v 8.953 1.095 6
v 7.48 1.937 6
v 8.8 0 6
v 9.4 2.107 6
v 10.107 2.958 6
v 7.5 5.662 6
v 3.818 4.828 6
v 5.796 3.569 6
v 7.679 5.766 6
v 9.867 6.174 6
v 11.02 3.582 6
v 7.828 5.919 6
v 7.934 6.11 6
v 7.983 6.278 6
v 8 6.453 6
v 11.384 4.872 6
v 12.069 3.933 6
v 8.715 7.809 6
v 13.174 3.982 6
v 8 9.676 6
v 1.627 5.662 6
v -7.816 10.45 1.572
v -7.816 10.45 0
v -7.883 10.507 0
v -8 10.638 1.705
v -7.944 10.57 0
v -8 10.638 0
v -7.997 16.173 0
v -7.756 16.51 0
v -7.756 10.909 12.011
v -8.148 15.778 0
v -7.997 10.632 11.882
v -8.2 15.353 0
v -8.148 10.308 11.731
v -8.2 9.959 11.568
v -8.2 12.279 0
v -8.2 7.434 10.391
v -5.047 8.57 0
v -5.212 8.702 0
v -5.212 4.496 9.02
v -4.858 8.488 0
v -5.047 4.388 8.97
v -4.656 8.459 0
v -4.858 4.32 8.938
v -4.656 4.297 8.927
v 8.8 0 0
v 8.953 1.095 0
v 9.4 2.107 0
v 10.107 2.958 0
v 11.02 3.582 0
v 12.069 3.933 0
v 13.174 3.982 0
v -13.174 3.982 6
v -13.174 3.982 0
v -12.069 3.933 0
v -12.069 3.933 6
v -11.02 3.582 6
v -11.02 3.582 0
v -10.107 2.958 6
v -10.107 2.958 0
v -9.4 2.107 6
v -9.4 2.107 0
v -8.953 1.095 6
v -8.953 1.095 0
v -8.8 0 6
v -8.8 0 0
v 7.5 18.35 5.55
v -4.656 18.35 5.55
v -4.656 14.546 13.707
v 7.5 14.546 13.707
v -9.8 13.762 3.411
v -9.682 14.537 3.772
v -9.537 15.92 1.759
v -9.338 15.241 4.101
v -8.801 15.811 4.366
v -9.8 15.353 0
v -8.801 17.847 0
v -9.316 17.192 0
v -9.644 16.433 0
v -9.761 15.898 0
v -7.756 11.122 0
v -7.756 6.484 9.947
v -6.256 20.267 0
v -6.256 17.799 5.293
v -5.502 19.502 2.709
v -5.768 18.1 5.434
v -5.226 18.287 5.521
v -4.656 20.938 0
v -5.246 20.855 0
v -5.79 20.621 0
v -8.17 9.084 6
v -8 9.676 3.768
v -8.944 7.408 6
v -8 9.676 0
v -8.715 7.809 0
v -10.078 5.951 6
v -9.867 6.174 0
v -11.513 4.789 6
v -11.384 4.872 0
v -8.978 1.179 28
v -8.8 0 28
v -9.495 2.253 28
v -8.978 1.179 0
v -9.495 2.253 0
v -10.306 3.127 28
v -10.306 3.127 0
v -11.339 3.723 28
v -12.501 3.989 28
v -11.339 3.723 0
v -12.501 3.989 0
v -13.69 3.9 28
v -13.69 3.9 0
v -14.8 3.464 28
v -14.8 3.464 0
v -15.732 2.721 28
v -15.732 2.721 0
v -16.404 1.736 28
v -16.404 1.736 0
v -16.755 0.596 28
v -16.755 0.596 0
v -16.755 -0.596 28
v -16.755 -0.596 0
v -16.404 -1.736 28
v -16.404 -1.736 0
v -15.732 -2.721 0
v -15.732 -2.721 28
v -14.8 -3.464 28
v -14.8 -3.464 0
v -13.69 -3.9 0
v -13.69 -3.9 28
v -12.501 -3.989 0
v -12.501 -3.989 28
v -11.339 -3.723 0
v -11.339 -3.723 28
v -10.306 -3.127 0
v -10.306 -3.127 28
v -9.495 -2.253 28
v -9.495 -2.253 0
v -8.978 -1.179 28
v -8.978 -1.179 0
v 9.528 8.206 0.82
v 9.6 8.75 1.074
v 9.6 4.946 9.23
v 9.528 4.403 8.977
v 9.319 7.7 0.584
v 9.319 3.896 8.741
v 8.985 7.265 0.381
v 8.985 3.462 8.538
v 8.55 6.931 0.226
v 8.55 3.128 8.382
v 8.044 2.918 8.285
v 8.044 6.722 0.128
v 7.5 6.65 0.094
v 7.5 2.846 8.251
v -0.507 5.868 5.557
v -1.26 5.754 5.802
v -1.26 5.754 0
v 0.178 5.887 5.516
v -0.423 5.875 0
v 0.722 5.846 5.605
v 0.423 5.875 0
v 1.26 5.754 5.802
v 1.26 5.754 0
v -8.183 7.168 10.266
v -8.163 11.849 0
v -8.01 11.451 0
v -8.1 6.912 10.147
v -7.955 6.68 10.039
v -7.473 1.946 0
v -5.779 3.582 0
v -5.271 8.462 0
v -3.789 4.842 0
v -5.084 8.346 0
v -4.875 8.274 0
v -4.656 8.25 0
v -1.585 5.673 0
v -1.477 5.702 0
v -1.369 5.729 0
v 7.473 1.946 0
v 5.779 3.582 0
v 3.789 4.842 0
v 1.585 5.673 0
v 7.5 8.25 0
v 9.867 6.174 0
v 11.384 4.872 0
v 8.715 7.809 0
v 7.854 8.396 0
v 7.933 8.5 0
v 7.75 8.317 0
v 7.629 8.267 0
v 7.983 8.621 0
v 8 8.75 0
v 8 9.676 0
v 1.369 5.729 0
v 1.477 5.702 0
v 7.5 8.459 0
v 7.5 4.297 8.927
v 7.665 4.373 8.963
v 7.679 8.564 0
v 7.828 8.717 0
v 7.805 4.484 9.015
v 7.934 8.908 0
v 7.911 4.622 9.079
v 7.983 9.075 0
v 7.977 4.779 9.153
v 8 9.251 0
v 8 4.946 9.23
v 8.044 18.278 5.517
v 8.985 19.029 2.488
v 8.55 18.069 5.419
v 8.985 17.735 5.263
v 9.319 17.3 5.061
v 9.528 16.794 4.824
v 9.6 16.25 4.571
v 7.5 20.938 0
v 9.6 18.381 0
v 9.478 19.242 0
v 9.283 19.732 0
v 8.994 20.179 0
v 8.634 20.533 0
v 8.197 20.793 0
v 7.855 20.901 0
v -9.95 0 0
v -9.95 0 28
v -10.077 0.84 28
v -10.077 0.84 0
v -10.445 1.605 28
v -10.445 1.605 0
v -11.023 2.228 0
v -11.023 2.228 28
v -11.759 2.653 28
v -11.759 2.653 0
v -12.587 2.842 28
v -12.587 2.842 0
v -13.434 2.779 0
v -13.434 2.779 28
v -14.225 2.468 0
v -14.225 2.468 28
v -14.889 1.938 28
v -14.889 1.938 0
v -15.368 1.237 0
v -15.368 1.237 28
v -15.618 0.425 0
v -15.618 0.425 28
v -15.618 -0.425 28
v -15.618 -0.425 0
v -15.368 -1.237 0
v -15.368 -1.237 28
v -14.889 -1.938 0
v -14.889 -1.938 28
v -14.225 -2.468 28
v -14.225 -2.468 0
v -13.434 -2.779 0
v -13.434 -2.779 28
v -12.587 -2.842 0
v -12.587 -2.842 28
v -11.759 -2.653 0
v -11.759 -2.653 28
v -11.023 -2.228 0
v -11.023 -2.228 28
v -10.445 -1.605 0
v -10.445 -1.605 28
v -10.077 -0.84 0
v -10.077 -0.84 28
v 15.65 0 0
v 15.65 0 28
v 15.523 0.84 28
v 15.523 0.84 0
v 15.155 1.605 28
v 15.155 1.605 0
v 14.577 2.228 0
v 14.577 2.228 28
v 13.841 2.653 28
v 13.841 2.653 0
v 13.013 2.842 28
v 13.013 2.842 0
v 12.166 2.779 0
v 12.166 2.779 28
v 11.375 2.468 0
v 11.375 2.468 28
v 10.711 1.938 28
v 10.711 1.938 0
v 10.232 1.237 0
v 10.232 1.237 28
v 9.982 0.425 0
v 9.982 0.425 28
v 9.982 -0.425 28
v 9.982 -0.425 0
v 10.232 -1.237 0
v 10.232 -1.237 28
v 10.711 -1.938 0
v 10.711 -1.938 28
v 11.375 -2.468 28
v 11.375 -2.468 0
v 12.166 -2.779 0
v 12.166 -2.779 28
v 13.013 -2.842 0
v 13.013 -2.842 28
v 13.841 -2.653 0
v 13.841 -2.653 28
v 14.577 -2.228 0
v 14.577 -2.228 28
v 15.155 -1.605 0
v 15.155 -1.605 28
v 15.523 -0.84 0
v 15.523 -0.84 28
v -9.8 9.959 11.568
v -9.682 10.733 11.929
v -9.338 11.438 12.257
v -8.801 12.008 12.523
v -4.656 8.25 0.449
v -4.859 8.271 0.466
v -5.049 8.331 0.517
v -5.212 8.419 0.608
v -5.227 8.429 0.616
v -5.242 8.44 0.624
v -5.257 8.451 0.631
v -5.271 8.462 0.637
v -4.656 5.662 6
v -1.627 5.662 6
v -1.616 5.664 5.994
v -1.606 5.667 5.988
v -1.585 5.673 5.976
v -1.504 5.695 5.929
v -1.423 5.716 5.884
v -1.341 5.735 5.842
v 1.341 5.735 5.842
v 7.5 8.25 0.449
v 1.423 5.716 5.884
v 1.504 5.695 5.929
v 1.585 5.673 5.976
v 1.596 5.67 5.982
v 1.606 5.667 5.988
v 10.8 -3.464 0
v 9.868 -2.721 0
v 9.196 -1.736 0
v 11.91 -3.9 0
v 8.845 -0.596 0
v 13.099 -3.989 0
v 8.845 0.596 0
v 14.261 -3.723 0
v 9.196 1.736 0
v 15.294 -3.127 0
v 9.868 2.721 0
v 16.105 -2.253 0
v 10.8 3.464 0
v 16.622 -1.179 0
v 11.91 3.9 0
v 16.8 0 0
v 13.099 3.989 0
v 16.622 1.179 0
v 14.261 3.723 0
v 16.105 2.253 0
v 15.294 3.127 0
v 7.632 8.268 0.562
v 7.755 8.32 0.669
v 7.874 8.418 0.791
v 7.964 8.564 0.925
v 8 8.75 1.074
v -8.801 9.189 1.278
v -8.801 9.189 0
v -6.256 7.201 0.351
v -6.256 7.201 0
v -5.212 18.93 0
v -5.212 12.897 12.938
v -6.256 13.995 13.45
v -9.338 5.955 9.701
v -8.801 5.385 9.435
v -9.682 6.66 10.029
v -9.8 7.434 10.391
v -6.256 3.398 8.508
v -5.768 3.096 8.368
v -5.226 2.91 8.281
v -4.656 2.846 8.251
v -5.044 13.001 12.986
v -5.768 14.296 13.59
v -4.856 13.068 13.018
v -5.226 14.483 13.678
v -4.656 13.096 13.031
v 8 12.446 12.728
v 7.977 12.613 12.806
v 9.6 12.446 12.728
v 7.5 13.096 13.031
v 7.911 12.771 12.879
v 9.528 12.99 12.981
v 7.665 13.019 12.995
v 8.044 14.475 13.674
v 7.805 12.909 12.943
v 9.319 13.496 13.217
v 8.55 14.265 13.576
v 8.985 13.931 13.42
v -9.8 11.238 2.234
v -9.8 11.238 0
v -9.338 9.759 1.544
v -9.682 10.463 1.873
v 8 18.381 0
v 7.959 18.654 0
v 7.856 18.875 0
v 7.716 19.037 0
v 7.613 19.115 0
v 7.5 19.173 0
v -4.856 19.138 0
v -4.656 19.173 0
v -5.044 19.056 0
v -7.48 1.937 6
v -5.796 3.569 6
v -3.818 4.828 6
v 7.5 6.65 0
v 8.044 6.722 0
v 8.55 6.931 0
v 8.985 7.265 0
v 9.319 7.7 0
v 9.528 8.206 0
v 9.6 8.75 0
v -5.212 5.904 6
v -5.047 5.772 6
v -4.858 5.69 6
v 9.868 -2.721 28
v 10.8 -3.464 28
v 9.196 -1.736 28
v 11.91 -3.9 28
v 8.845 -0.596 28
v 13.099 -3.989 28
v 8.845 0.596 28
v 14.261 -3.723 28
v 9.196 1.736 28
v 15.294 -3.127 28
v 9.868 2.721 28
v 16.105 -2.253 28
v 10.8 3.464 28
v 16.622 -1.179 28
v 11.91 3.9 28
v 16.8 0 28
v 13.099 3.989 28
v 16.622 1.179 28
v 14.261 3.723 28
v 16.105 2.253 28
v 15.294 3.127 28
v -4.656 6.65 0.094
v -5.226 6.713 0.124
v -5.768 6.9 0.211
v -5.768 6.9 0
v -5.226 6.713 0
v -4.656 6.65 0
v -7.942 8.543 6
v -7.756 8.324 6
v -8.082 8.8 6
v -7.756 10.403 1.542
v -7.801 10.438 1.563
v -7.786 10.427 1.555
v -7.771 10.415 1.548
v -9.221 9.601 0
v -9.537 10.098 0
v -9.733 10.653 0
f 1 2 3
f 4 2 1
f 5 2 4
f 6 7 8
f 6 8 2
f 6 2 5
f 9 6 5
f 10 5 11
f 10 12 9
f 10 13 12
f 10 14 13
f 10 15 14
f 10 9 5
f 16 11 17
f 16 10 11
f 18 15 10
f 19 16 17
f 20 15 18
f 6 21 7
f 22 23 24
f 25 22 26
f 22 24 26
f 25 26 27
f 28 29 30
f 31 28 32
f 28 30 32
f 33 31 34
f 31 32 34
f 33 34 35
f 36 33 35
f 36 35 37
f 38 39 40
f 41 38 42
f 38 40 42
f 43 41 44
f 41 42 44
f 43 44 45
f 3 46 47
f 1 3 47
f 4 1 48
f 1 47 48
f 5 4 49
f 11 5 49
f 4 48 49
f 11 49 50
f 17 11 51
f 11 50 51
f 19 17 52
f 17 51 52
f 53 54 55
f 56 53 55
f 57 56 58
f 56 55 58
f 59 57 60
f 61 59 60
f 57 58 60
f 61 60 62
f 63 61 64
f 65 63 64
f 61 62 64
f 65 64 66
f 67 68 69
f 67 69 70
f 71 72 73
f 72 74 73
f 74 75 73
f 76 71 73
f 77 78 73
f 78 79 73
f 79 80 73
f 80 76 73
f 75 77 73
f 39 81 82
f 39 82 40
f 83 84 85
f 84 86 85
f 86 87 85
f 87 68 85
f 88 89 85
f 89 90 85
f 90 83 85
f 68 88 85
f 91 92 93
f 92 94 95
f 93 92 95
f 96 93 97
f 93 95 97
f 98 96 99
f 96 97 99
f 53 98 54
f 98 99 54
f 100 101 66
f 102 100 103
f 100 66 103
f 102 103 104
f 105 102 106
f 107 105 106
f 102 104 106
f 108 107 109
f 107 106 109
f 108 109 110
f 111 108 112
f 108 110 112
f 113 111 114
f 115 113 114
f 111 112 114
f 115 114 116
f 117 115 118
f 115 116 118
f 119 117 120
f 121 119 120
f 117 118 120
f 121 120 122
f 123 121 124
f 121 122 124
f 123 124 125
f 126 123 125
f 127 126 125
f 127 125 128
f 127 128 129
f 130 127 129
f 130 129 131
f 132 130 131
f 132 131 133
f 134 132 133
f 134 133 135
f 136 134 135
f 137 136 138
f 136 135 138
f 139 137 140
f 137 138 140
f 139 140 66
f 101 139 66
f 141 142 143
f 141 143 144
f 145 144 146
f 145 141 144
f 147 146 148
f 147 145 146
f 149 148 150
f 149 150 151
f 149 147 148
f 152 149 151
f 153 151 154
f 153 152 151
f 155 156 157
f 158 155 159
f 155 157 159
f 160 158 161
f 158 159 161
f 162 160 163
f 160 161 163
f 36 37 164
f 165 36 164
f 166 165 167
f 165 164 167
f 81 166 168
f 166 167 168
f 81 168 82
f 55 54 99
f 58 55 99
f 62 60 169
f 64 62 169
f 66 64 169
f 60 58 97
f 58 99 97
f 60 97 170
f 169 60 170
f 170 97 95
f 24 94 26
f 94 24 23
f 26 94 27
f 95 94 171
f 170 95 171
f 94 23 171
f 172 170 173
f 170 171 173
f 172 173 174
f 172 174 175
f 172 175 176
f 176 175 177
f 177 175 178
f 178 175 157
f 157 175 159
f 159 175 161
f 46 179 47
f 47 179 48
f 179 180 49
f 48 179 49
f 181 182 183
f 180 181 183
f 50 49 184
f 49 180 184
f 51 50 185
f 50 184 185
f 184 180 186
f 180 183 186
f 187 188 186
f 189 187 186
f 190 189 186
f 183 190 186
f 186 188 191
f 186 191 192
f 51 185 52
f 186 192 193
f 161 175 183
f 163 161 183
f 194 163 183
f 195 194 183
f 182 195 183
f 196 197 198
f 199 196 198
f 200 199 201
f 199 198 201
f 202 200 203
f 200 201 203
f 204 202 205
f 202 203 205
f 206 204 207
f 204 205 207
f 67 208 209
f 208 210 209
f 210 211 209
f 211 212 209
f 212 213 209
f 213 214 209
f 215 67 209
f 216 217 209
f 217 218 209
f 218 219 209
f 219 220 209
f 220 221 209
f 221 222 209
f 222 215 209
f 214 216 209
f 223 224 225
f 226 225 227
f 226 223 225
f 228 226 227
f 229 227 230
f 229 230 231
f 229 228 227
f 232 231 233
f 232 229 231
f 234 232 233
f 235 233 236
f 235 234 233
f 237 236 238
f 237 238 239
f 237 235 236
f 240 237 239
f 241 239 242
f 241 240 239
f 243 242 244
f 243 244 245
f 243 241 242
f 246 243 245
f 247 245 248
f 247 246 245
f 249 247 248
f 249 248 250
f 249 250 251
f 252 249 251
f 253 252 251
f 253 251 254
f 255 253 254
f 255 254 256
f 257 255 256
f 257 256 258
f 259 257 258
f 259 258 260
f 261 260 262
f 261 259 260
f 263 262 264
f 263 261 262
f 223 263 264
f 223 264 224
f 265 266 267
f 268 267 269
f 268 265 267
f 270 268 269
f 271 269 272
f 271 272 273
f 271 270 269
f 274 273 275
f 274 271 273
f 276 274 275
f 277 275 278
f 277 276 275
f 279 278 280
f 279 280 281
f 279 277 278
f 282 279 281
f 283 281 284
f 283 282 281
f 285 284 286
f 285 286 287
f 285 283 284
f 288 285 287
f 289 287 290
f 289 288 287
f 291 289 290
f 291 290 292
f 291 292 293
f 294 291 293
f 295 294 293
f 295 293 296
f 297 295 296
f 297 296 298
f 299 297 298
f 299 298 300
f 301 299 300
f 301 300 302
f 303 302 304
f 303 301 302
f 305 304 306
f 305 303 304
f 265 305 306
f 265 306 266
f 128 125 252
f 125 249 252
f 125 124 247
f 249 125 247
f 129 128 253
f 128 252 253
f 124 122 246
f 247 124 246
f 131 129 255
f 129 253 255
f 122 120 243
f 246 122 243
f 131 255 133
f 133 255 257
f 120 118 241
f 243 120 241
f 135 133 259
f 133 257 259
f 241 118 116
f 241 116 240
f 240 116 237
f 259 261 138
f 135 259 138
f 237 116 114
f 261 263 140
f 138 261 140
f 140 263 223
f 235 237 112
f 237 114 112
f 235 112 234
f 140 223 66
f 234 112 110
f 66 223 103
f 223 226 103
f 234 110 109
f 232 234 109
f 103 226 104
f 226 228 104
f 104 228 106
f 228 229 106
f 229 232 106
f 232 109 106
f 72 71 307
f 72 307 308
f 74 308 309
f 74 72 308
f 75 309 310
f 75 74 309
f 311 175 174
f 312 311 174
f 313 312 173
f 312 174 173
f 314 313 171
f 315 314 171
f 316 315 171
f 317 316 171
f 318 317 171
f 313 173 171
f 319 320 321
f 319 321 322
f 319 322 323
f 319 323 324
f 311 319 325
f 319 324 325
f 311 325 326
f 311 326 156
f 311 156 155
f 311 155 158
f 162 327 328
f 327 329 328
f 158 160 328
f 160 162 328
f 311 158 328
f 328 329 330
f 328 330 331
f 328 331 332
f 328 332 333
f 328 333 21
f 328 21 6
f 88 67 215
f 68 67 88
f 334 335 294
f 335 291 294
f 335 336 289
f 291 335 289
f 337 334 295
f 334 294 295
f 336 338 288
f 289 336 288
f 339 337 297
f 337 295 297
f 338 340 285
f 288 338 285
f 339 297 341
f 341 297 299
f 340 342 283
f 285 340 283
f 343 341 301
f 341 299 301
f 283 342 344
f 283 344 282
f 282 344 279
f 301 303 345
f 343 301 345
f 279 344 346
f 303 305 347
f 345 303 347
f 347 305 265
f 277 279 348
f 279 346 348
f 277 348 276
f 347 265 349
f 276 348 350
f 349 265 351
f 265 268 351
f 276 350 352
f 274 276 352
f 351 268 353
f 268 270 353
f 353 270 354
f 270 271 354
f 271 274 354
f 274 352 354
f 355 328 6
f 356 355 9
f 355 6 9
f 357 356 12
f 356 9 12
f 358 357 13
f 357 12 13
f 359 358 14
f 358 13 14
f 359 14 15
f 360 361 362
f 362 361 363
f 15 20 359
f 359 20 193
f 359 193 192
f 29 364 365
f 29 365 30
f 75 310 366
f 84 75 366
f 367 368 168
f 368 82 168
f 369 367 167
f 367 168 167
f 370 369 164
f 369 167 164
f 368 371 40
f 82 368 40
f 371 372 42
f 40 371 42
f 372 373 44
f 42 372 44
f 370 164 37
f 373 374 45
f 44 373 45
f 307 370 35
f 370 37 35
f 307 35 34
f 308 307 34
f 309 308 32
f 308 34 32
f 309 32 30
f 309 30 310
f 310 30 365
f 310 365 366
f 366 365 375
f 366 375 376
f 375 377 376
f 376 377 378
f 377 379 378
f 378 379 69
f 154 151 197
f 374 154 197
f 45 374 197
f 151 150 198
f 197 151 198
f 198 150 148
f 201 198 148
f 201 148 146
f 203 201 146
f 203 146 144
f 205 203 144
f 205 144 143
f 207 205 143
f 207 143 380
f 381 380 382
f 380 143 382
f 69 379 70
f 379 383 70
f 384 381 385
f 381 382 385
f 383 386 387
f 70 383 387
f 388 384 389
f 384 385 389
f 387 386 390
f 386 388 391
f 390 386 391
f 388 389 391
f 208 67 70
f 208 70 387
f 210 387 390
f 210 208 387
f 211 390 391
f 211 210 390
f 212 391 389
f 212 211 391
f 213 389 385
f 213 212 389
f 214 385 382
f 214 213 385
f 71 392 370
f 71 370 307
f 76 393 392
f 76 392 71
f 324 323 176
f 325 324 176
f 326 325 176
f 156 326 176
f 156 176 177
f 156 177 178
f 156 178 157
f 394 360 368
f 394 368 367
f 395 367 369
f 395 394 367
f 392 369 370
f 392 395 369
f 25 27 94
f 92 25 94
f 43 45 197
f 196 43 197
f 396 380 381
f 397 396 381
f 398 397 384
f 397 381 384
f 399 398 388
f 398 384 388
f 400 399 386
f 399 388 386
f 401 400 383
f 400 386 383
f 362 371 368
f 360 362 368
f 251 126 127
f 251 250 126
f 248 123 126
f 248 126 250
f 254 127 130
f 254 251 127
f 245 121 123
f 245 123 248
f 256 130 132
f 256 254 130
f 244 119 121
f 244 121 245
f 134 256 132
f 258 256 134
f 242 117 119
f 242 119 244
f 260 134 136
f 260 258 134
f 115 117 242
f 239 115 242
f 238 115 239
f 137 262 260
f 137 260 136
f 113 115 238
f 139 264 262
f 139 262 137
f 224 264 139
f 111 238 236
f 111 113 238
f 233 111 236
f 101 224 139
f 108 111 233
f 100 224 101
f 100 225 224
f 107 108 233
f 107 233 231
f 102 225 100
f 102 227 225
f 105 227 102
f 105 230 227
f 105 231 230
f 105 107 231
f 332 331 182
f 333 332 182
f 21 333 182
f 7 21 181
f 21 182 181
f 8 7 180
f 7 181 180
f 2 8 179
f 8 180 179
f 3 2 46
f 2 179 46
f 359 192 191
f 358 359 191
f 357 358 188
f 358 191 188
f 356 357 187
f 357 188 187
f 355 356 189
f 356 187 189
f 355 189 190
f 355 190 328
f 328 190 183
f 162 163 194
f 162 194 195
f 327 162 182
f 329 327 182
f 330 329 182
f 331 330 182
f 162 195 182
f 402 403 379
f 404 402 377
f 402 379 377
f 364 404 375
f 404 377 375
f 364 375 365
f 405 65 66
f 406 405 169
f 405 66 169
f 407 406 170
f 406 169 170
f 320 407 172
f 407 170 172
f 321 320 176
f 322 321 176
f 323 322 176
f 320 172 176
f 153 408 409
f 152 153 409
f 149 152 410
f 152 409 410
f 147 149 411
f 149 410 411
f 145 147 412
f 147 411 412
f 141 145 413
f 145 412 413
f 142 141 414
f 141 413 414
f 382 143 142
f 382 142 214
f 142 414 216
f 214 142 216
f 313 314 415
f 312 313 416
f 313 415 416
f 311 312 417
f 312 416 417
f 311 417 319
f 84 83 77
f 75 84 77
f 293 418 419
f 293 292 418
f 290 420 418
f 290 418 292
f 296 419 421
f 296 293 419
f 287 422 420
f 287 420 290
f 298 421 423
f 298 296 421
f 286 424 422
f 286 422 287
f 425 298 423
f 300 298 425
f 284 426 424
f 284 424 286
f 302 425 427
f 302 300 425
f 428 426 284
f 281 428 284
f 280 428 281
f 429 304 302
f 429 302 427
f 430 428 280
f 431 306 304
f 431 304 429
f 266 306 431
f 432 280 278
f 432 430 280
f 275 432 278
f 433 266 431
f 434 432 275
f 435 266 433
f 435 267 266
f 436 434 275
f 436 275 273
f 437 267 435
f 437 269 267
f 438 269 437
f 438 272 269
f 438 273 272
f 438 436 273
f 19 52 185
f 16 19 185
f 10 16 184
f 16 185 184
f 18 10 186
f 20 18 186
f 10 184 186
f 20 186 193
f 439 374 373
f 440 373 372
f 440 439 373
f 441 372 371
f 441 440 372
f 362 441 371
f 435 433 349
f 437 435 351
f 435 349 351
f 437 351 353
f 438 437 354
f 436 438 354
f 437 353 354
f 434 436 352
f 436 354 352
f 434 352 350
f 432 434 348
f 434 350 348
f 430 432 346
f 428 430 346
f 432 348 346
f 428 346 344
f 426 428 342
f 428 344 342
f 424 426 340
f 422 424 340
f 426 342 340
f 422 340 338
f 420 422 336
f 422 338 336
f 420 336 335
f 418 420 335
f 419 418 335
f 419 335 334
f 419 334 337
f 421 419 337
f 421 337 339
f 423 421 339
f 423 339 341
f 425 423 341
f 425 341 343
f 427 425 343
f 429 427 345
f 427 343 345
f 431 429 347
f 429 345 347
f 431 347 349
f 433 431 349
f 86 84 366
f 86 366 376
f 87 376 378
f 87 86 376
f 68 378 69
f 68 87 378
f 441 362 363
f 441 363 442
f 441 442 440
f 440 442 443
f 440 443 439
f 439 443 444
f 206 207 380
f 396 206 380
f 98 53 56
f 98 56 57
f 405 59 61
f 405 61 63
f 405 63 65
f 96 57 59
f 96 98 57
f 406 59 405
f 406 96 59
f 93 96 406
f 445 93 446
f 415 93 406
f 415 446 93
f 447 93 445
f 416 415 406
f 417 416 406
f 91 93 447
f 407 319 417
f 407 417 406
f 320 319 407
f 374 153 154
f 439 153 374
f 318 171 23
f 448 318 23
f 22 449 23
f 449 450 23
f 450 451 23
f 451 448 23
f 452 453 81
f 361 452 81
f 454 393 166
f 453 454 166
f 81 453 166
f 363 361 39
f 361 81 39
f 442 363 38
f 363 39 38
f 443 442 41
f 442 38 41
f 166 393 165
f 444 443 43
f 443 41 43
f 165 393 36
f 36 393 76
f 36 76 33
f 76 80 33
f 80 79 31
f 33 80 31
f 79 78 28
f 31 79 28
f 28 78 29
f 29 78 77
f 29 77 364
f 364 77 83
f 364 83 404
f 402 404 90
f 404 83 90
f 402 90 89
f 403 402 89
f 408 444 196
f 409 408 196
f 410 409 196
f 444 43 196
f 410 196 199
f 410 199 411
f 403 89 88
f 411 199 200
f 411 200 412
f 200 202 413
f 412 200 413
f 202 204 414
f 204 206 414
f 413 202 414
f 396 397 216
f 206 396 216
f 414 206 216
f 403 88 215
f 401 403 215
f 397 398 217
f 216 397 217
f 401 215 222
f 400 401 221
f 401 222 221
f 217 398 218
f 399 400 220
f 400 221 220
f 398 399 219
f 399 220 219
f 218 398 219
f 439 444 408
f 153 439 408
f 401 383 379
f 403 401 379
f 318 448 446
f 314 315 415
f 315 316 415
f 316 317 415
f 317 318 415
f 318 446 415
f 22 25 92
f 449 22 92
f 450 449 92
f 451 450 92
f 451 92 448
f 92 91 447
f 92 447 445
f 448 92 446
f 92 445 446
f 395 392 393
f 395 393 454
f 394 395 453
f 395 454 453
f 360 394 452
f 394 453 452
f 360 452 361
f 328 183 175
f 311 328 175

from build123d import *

# Parameters (mm, degrees)
F0_R      = 4
F0_R_2    = 2.85
F2_DEPTH  = 28
F4_DEPTH  = 6
F7_DEPTH  = 50
F8_REACH  = 28.3339417877
F9_DEPTH  = 9
F10_DEPTH = 6
F12_DEPTH = 50


# Not quite as in the source:
# - a feature names something its author has since deleted; it is built from what else it names


with BuildPart() as f2:
    # F0 (on Top) → F2 (new body)
    with BuildSketch(Plane.XY):
        with Locations((-12.8, 0)):
            Circle(F0_R)
        with Locations((-12.8, 0)):
            Circle(F0_R_2, mode=Mode.SUBTRACT)
    extrude(amount=F2_DEPTH)


with BuildPart() as f2b:
    # F0 (on Top) → F2, piece 2 (new body)
    with BuildSketch(Plane.XY):
        with Locations((12.8, 0)):
            Circle(F0_R)
        with Locations((12.8, 0)):
            Circle(F0_R_2, mode=Mode.SUBTRACT)
    extrude(amount=F2_DEPTH)


with BuildPart() as f4:
    # F3 (on Top) → F4 (new body)
    with BuildSketch(Plane.XY):
        with BuildLine():
            Line((7.5, 18.35), (-4.6556847597, 18.35))
            ThreePointArc((-4.6556847597, 18.35), (-5.5021347681, 18.2083576597), (-6.2563592688, 17.7988633717))
            Line((-6.2563592688, 17.7988633717), (-8.8006745091, 15.8111170902))
            ThreePointArc((-8.8006745091, 15.8111170902), (-9.5368519127, 14.9020445494), (-9.8, 13.7622537185))
            Line((-9.8, 13.7622537185), (-9.8, 12.5))
            Line((-9.8, 12.5), (-9.8, 11.2377462815))
            ThreePointArc((-9.8, 11.2377462815), (-9.5368519127, 10.0979554506), (-8.8006745091, 9.1888829098))
            Line((-8.8006745091, 9.1888829098), (-6.2563592688, 7.2011366283))
            ThreePointArc((-6.2563592688, 7.2011366283), (-5.5021347681, 6.7916423403), (-4.6556847597, 6.65))
            Line((-4.6556847597, 6.65), (7.5, 6.65))
            ThreePointArc((7.5, 6.65), (8.9849242405, 7.2650757595), (9.6, 8.75))
            Line((9.6, 8.75), (9.6, 12.5))
            Line((9.6, 12.5), (9.6, 16.25))
            ThreePointArc((9.6, 16.25), (8.9849242405, 17.7349242405), (7.5, 18.35))
        make_face()
    extrude(amount=F4_DEPTH)

    # F6 (on offset) → F7 (cut)
    with BuildSketch(Plane.YZ.offset(9.6)):
        Polygon((6.4474307001, 6.8065319635), (6.4474307001, 0), (21.0440856005, 6.8065319635), align=None)
    extrude(amount=-F7_DEPTH, mode=Mode.SUBTRACT)

    f8_end = Plane(origin=(0.3975429919, 12.5, 0), x_dir=(-1, 0, 0), z_dir=(0, 0, -1))
    # F7_face (on face) → F8 (join, up to a plane its end follows)
    with BuildSketch(Plane(origin=(0.3975429919, 12.5, 2.8223594161), x_dir=(1, 0, 0), z_dir=(0, -0.4226182617, 0.906307787))):
        with BuildLine():
            Line((9.2024570081, -4.1376671961), (9.2024570081, 4.1376671961))
            add(Edge.make_bspline(
                [(7.1024570081, 6.4547608259), (9.2024570081, 6.4547608259), (9.2024570081, 4.1376671961)],
                knots=[3.1415926536, 3.1415926536, 3.1415926536, 4.7123889804, 4.7123889804, 4.7123889804], degree=2, weights=[1, 0.7071067812, 1]))
            Line((7.1024570081, 6.4547608259), (-5.0532277516, 6.4547608259))
            add(Edge.make_bspline(
                [(-6.6539022607, 5.8466488399), (-5.9484473765, 6.4547608259), (-5.0532277516, 6.4547608259)],
                knots=[2.4783896609, 2.4783896609, 2.4783896609, 3.1415926536, 3.1415926536, 3.1415926536], degree=2, weights=[1, 0.9455221768, 1]))
            Line((-6.6539022607, 5.8466488399), (-9.198217501, 3.6534134844))
            add(Edge.make_bspline(
                [(-10.1975429919, 1.3927428811), (-10.1975429919, 2.7919809215), (-9.198217501, 3.6534134844)],
                knots=[1.5707963268, 1.5707963268, 1.5707963268, 2.4783896609, 2.4783896609, 2.4783896609], degree=2, weights=[1, 0.8987891972, 1]))
            Line((-10.1975429919, 1.3927428811), (-10.1975429919, -1.3927428811))
            add(Edge.make_bspline(
                [(-9.198217501, -3.6534134844), (-10.1975429919, -2.7919809215), (-10.1975429919, -1.3927428811)],
                knots=[0.6632029927, 0.6632029927, 0.6632029927, 1.5707963268, 1.5707963268, 1.5707963268], degree=2, weights=[1, 0.8987891972, 1]))
            Line((-9.198217501, -3.6534134844), (-6.6539022607, -5.8466488399))
            add(Edge.make_bspline(
                [(-5.0532277516, -6.4547608259), (-5.9484473765, -6.4547608259), (-6.6539022607, -5.8466488399)],
                knots=[0, 0, 0, 0.6632029927, 0.6632029927, 0.6632029927], degree=2, weights=[1, 0.9455221768, 1]))
            Line((-5.0532277516, -6.4547608259), (7.1024570081, -6.4547608259))
            add(Edge.make_bspline(
                [(9.2024570081, -4.1376671961), (9.2024570081, -6.4547608259), (7.1024570081, -6.4547608259)],
                knots=[4.7123889804, 4.7123889804, 4.7123889804, 6.2831853072, 6.2831853072, 6.2831853072], degree=2, weights=[1, 0.7071067812, 1]))
        make_face()
    f8_long = extrude(amount=-F8_REACH, mode=Mode.PRIVATE)
    add(split(f8_long, bisect_by=f8_end, keep=Keep.BOTTOM, mode=Mode.PRIVATE))

    # F9 (add): a face of the model
    f9_faces = [f4.faces().sort_by_distance(p)[0] for p in [
        (0.3975429919, 12.5, 2.8223594161),
    ]]
    extrude(f9_faces, amount=F9_DEPTH)


with BuildPart() as f10:
    # F1 (on Top) → F10 (new body)
    with BuildSketch(Plane.XY):
        with BuildLine():
            ThreePointArc((-1.2596207883, 5.7537340458), (0, 5.89), (1.2596207883, 5.7537340458))
            ThreePointArc((1.2596207883, 5.7537340458), (1.4230201919, 5.7155151591), (1.5852645107, 5.6726569111))
            ThreePointArc((1.5852645107, 5.6726569111), (5.7790969207, 3.5822201075), (8.8, 0))
            ThreePointArc((8.8, 0), (10.1071311565, 2.9577791317), (13.174228696, 3.9824556348))
            ThreePointArc((13.174228696, 3.9824556348), (9.8667045598, 6.1744840875), (8, 9.6759293228))
            Line((8, 9.6759293228), (8, 8.75))
            ThreePointArc((8, 8.75), (7.8535533906, 8.3964466094), (7.5, 8.25))
            Line((7.5, 8.25), (-4.6556847597, 8.25))
            ThreePointArc((-4.6556847597, 8.25), (-4.9812424552, 8.3044778232), (-5.2713288016, 8.4619756263))
            Line((-5.2713288016, 8.4619756263), (-7.815644042, 10.4497219078))
            ThreePointArc((-7.815644042, 10.4497219078), (-7.9140380275, 10.5376393644), (-8, 10.6377462815))
            Line((-8, 10.6377462815), (-8, 9.6759293228))
            ThreePointArc((-8, 9.6759293228), (-9.8667045598, 6.1744840875), (-13.174228696, 3.9824556348))
            ThreePointArc((-13.174228696, 3.9824556348), (-10.1071311565, 2.9577791317), (-8.8, 0))
            ThreePointArc((-8.8, 0), (-5.7790969207, 3.5822201075), (-1.5852645107, 5.6726569111))
            ThreePointArc((-1.5852645107, 5.6726569111), (-1.4230201919, 5.7155151591), (-1.2596207883, 5.7537340458))
        make_face()
    extrude(amount=F10_DEPTH)


with BuildPart() as f12_tool:
    # F11 (on face) → F12 (new body)
    with BuildSketch(Plane(origin=(0, -2.6520132898, 5.6872608532), x_dir=(1, 0, 0), z_dir=(0, -0.4226182617, 0.906307787))):
        with BuildLine():
            ThreePointArc((8, 16.6592951645), (7.8626590068, 17.0963944879), (7.5, 17.3763887943))
            Line((7.5, 17.3763887943), (-4.6556847597, 17.3763887943))
            ThreePointArc((-4.6556847597, 17.3763887943), (-4.9522690953, 17.3133448608), (-5.2116940879, 17.1563879273))
            Line((-5.2116940879, 17.1563879273), (-7.7560093283, 14.9631525718))
            ThreePointArc((-7.7560093283, 14.9631525718), (-8.0844304273, 14.4838159341), (-8.2, 13.9143708495))
            Line((-8.2, 13.9143708495), (-8.2, 11.1288850873))
            ThreePointArc((-8.2, 11.1288850873), (-8.1004846181, 10.5526436305), (-7.7560093283, 10.080103365))
            Line((-7.7560093283, 10.080103365), (-5.2116940879, 7.8868680095))
            ThreePointArc((-5.2116940879, 7.8868680095), (-4.9546608267, 7.7238664411), (-4.6556847597, 7.6668671425))
            Line((-4.6556847597, 7.6668671425), (7.5, 7.6668671425))
            ThreePointArc((7.5, 7.6668671425), (7.8626590068, 7.9468614489), (8, 8.3839607723))
            Line((8, 8.3839607723), (8, 16.6592951645))
        make_face()
    extrude(amount=-F12_DEPTH)


with BuildPart() as f4_1:
    add(f4.part)

    # F12: cut by f12_tool
    add(f12_tool.part, mode=Mode.SUBTRACT)


with BuildPart() as f10_1:
    add(f10.part)

    # F12: cut by f12_tool
    add(f12_tool.part, mode=Mode.SUBTRACT)


solid = Compound([f2.part, f2b.part, f4_1.part, f10_1.part])
